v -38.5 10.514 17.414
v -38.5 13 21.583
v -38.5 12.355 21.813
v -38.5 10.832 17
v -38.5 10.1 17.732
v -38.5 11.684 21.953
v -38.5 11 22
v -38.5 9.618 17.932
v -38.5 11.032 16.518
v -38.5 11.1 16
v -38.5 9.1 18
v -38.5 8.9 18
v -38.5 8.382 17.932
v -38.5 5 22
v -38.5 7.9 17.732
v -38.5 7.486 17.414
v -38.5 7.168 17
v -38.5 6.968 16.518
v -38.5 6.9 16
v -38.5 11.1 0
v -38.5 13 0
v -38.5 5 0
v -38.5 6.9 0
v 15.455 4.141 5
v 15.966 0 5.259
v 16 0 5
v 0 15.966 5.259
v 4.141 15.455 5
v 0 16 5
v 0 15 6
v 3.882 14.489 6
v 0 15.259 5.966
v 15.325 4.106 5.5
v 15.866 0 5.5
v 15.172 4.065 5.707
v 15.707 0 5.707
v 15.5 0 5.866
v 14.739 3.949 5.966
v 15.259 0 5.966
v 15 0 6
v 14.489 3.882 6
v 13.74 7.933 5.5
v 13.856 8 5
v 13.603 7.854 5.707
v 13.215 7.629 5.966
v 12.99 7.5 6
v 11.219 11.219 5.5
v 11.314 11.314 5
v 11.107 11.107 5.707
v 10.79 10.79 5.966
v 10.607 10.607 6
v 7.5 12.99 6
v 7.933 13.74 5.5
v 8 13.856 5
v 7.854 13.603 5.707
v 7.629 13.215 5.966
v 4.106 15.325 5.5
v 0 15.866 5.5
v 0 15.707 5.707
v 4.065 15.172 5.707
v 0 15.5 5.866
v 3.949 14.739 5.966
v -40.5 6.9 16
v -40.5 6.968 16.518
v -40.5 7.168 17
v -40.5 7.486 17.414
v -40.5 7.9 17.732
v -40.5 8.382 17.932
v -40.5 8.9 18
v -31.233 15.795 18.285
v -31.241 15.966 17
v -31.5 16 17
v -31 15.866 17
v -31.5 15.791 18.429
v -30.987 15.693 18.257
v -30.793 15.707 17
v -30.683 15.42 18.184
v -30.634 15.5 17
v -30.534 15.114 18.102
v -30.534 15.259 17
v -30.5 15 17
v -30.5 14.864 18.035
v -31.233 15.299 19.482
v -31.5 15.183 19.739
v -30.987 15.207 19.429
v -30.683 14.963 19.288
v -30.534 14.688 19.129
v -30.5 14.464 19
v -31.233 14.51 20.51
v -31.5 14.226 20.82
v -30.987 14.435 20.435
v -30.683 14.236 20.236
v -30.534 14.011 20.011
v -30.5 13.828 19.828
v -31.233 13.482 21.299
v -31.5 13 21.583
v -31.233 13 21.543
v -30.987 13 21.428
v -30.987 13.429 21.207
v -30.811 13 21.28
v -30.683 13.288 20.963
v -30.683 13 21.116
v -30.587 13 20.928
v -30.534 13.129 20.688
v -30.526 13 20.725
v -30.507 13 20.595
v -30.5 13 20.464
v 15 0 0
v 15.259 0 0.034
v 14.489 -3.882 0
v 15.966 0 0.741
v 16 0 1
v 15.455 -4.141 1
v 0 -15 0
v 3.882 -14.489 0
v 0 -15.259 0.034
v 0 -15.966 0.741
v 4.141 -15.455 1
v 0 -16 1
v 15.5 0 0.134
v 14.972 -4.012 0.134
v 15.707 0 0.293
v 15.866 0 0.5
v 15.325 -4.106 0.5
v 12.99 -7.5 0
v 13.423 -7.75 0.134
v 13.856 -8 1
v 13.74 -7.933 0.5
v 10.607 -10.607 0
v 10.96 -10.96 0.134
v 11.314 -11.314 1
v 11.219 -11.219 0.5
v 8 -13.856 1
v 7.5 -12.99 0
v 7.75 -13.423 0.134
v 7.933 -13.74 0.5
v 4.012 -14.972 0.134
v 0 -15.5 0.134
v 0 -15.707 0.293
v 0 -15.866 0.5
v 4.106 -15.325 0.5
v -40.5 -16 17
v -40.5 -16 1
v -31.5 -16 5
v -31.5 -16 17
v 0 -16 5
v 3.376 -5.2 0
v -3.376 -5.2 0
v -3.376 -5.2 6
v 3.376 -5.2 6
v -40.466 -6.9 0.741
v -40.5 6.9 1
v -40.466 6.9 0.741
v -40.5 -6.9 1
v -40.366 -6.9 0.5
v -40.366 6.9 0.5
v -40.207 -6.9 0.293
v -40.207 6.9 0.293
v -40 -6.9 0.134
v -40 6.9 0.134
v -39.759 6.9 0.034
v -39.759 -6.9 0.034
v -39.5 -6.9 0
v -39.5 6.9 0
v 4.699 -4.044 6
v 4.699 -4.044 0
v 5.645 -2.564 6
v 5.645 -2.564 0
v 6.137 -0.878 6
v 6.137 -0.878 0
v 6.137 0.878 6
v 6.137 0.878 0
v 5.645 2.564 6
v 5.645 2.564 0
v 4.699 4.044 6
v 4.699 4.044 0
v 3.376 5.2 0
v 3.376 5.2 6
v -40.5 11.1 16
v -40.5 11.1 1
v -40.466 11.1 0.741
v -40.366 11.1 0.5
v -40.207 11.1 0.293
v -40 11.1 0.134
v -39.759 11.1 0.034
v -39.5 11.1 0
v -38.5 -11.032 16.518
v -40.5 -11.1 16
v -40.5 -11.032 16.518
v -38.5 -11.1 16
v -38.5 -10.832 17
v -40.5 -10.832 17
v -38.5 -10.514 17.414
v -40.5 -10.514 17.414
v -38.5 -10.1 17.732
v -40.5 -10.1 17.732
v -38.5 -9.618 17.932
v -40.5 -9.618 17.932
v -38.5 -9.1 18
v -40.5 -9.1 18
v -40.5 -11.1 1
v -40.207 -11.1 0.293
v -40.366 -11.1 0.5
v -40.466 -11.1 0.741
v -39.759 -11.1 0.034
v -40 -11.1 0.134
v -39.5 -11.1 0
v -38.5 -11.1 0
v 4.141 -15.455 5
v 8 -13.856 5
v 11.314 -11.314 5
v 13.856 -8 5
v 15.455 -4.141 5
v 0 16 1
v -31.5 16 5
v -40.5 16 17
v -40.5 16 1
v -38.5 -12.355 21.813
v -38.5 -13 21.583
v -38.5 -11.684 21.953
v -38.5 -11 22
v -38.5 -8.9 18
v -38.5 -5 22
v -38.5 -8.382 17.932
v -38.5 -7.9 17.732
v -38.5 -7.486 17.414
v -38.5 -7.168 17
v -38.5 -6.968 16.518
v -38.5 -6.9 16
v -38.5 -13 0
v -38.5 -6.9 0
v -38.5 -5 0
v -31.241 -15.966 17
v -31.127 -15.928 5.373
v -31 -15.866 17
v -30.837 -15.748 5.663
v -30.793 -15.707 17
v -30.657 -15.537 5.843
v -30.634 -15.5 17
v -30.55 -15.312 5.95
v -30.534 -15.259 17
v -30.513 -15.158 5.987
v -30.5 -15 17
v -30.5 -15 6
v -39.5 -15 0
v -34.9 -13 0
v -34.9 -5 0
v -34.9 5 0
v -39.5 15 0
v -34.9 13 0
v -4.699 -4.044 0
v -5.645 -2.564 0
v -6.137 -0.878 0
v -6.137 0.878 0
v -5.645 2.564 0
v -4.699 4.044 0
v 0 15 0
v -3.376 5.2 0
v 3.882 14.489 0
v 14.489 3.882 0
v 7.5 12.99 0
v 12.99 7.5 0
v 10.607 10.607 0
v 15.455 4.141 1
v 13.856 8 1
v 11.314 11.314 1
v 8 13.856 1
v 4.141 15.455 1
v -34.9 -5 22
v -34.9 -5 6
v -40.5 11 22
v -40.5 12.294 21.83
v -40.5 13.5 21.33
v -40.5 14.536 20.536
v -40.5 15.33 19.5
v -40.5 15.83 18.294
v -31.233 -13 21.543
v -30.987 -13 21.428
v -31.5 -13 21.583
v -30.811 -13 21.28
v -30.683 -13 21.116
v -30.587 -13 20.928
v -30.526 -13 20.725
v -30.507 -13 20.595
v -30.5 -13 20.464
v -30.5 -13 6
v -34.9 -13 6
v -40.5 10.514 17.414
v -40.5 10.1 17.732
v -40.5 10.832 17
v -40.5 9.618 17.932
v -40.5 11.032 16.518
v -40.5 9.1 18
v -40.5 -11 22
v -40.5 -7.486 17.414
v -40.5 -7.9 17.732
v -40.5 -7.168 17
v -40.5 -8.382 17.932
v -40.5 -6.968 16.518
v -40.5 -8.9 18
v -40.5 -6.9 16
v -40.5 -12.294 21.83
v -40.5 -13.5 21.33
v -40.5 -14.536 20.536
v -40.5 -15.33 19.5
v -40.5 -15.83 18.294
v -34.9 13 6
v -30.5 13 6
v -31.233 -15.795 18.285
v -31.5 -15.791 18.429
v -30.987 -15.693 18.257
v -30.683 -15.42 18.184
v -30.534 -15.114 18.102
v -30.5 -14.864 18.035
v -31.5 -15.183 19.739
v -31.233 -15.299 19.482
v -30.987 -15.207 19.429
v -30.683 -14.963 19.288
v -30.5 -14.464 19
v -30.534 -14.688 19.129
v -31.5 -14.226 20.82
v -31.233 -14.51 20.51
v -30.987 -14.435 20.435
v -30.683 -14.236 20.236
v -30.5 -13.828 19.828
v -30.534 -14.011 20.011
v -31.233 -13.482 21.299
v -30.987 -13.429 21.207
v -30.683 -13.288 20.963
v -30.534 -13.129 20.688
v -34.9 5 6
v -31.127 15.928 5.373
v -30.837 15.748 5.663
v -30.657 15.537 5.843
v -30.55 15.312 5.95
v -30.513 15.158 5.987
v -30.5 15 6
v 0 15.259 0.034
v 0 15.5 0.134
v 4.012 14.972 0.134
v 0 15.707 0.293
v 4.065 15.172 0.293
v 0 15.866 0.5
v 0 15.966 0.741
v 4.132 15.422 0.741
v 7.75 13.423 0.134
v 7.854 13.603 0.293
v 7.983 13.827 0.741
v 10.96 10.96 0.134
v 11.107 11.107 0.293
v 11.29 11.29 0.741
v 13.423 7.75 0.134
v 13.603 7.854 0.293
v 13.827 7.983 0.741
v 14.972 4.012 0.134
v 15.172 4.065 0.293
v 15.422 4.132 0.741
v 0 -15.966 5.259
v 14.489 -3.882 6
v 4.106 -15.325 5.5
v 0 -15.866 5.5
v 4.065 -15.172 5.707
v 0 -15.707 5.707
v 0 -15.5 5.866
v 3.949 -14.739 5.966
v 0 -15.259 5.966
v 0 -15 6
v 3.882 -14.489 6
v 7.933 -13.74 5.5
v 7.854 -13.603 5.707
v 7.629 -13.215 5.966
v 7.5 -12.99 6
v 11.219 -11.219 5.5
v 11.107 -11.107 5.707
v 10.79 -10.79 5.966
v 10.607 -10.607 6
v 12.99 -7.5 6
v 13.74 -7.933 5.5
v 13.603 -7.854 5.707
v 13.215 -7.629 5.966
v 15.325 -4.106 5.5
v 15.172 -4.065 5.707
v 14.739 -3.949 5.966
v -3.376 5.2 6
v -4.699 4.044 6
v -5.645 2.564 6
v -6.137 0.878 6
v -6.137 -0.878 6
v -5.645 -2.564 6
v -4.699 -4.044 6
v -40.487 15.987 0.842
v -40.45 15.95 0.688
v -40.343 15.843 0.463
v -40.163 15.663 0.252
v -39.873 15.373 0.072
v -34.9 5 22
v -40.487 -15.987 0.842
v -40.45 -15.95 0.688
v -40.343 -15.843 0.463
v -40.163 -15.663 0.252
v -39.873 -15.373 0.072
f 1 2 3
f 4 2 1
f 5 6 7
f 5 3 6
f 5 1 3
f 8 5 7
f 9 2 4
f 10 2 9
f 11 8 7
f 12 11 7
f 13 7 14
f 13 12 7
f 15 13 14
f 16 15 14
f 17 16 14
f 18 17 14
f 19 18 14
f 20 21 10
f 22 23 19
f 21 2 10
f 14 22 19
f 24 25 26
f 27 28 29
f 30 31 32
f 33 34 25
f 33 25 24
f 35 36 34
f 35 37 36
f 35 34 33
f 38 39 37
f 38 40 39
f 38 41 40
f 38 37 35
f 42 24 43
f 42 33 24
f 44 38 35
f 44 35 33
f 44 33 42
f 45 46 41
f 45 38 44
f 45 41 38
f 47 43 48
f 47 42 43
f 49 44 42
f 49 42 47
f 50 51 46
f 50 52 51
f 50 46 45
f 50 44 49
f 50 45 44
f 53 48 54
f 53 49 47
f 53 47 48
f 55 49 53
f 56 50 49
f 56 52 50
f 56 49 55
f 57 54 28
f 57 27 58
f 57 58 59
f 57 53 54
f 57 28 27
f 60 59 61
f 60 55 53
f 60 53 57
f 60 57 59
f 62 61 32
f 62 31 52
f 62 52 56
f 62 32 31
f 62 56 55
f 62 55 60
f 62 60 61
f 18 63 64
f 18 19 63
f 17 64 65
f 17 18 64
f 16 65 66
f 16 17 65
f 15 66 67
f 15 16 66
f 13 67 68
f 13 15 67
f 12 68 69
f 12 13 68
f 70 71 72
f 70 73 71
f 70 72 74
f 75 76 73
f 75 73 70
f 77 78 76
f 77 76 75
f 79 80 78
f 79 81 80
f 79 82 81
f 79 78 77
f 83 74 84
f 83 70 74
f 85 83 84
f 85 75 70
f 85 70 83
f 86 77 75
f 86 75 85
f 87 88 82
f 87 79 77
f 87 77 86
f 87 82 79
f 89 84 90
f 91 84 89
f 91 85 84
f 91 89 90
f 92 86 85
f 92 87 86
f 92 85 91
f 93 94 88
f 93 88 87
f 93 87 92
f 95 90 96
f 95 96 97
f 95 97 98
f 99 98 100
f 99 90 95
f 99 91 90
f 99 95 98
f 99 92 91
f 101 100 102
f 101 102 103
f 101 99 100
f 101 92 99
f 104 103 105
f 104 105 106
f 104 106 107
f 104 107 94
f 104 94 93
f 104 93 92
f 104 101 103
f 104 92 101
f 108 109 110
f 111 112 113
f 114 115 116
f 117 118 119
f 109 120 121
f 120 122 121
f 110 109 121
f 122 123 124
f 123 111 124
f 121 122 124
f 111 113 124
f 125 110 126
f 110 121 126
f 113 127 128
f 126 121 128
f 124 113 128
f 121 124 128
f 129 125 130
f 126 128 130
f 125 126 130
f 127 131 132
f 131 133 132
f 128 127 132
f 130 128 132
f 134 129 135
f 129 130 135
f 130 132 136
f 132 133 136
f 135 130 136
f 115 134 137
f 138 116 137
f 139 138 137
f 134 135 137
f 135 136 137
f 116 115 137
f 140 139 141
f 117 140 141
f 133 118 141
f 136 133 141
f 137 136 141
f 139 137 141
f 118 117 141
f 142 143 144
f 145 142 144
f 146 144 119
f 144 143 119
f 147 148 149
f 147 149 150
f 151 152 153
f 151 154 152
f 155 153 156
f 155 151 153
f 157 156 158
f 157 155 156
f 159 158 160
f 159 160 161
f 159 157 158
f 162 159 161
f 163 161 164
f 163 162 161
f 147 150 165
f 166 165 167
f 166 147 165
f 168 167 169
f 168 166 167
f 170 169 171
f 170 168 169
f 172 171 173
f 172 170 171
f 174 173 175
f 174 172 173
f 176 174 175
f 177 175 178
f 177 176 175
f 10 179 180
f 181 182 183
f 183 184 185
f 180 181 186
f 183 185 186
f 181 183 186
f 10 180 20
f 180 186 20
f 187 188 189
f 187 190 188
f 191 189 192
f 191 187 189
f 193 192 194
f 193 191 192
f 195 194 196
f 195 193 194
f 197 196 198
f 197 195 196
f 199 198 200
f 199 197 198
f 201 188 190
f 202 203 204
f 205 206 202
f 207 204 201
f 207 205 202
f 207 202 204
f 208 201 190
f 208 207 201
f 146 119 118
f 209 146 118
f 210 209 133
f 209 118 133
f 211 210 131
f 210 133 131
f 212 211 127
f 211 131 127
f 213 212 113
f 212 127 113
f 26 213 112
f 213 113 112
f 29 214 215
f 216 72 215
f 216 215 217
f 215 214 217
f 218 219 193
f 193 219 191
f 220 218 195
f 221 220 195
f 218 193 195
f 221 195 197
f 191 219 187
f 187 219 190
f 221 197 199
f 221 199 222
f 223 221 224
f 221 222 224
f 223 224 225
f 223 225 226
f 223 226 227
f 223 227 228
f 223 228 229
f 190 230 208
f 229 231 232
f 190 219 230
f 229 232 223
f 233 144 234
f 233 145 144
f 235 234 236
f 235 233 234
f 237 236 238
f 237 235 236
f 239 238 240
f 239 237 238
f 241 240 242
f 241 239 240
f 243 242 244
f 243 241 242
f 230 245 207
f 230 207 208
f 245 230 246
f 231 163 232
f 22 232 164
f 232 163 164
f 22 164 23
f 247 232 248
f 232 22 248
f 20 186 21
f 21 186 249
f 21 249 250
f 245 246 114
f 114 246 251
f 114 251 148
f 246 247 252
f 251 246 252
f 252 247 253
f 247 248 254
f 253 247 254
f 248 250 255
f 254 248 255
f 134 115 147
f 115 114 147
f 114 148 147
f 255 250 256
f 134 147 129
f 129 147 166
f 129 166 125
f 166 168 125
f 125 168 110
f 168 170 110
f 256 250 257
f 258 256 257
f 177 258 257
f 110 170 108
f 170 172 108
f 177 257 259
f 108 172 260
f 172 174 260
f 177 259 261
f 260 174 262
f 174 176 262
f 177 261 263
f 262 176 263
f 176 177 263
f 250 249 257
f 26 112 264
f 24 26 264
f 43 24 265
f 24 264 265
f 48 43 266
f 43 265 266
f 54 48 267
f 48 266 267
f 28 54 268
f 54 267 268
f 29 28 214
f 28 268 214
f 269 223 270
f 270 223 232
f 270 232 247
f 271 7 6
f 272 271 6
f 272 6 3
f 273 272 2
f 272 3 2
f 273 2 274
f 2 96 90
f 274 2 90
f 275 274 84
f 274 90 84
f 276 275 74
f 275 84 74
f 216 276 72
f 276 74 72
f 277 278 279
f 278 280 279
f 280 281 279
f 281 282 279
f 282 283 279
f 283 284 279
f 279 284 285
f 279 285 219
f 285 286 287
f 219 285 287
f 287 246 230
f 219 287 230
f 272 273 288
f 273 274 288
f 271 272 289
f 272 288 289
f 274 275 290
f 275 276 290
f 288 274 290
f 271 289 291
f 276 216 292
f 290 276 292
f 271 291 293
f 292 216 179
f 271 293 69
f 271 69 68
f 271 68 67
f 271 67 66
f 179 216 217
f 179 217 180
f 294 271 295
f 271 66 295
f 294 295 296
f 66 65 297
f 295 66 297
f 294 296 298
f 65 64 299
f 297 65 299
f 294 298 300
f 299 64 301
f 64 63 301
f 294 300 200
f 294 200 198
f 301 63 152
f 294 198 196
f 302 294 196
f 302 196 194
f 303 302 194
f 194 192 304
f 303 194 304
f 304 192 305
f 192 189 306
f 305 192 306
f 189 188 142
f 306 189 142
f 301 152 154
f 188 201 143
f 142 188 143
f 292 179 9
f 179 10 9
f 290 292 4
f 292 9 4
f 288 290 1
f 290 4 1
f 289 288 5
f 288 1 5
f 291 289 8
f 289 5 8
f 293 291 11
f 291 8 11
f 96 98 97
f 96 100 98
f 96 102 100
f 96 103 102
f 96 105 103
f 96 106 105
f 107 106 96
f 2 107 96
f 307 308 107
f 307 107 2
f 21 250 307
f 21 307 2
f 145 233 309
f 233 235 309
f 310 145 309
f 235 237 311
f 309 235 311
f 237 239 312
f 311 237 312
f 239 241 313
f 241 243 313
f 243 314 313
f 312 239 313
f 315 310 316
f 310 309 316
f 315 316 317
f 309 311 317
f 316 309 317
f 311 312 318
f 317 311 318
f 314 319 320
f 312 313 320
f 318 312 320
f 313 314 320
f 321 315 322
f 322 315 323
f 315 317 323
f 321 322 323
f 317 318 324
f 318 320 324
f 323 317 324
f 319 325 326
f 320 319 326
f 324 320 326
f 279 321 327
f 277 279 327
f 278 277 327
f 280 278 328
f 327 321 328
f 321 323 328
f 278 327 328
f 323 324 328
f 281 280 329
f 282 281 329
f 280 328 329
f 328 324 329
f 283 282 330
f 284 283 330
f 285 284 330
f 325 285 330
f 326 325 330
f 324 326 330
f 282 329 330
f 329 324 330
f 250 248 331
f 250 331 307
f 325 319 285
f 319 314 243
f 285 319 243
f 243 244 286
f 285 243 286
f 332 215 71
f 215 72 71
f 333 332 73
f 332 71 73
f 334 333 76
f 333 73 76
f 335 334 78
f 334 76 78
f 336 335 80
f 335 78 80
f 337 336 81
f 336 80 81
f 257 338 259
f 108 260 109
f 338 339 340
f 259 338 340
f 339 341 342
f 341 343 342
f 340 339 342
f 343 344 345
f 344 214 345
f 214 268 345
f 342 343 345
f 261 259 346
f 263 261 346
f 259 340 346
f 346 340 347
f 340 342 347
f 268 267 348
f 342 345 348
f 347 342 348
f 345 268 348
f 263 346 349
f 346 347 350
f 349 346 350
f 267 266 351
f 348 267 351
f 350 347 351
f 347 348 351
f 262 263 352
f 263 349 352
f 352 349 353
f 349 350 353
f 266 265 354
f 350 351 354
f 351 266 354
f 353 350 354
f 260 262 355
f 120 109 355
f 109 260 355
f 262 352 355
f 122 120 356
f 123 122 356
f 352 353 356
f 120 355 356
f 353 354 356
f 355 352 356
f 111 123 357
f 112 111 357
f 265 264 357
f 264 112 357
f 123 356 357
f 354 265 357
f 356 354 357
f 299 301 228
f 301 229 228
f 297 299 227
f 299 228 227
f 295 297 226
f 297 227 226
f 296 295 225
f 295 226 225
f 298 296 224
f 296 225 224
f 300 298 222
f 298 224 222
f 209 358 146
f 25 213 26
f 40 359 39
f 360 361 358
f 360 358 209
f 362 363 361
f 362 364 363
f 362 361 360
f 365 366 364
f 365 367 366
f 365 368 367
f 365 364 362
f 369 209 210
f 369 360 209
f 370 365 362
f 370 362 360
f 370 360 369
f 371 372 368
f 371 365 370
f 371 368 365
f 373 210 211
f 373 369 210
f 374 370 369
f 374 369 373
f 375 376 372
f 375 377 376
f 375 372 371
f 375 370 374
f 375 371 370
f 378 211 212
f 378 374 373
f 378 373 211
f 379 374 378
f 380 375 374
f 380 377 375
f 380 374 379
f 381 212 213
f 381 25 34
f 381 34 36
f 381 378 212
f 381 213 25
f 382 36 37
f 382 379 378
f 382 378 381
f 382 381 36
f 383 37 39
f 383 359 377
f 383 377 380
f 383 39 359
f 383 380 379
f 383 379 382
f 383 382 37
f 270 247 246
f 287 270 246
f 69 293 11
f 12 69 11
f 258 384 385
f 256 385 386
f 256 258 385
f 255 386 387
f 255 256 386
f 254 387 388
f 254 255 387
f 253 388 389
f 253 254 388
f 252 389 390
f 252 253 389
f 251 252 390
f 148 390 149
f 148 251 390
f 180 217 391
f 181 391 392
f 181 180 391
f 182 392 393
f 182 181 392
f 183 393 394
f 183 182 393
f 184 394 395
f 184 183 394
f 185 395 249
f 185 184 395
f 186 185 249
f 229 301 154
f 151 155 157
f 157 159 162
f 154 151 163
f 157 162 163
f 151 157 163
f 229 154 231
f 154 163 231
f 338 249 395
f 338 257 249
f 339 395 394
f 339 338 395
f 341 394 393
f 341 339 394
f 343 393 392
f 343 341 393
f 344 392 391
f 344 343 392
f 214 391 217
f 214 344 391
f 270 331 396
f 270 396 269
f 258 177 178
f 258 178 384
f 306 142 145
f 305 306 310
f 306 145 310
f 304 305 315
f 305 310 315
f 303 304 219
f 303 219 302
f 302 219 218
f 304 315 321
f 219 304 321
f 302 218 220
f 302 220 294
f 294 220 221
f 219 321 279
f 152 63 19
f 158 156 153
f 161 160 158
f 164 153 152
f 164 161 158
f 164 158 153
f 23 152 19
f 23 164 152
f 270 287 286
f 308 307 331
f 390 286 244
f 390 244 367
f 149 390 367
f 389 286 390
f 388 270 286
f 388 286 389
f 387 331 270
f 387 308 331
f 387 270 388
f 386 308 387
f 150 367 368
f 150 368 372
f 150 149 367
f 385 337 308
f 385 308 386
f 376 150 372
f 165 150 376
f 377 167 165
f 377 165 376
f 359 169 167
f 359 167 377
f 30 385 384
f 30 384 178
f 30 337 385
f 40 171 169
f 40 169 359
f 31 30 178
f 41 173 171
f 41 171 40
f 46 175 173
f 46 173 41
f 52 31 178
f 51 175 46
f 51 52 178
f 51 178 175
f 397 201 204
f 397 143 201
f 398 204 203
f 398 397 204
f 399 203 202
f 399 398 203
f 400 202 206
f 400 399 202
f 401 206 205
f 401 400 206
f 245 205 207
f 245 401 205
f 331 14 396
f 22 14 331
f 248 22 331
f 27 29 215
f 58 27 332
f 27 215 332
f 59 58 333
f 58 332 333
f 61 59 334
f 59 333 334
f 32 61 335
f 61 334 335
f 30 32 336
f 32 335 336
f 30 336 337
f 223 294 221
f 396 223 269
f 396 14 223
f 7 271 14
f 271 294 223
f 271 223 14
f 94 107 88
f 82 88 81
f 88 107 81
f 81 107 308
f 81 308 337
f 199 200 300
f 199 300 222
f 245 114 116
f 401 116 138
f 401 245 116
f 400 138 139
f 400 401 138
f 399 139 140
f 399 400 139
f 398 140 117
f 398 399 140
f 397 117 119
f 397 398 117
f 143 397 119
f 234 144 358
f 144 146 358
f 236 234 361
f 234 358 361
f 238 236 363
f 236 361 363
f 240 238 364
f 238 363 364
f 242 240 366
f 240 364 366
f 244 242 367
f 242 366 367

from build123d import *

# Parameters (mm, degrees)
F1_DEPTH  = 6
F2_W      = 10
F2_H      = 32
F3_DEPTH  = 22
F4_W      = 2
F4_H      = 4.2
F5_DEPTH  = 18
F6_R      = 2
F10_DEPTH = 25
F13_DEPTH = 25
F14_R     = 5
F15_R     = 1
F16_R     = 1


with BuildPart() as f1:
    # F0 (on Top) → F1 (new body)
    with BuildSketch(Plane.XY):
        with BuildLine():
            ThreePointArc((0, -16), (11.313708499, -11.313708499), (16, 0))
            ThreePointArc((16, 0), (11.313708499, 11.313708499), (0, 16))
            Line((0, 16), (0, -16))
        make_face()
        with BuildLine():
            Line((0, -16), (0, 16))
            ThreePointArc((0, 16), (-16, 0), (0, -16))
        make_face()
        with BuildLine():
            ThreePointArc((0, -16), (-16, 0), (0, 16))
            Line((0, 16), (-40.5, 16))
            Line((-40.5, 16), (-40.5, -16))
            Line((-40.5, -16), (0, -16))
        make_face()
    extrude(amount=F1_DEPTH)

    # F2 (on Top) → F3 (join)
    with BuildSketch(Plane.XY):
        with Locations((-35.5, 0)):
            Rectangle(F2_W, F2_H)
    extrude(amount=F3_DEPTH)

    # F4 (on Top) → F5 (cut)
    with BuildSketch(Plane.XY):
        Polygon((-34.9, 13), (-38.5, 13), (-38.5, 11.1), (-38.5, 6.9), (-38.5, 5), (-34.9, 5), align=None)
        with Locations((-39.5, 9)):
            Rectangle(F4_W, F4_H)
    extrude(amount=F5_DEPTH, mode=Mode.SUBTRACT)

    # F6
    f6_edges = [f1.edges().sort_by_distance(p)[0] for p in [
        (-39.5, 6.9, 18),
        (-39.5, 11.1, 18),
    ]]
    fillet(f6_edges, radius=F6_R)

    # F7: F1 across plane


with BuildPart() as f1_1:
    add(f1.part)
    add(f1.part.mirror(Plane.XZ), mode=Mode.INTERSECT)

    # F9 (on offset) → F10 (cut)
    with BuildSketch(Plane.XY.offset(6)):
        Polygon((-30.5, 13), (-38.5, 13), (-38.5, 5), (-34.9, 5), (-34.9, -5), (-38.5, -5), (-38.5, -13), (-30.5, -13), align=None)
    extrude(amount=F10_DEPTH, mode=Mode.SUBTRACT)

    # F12 (on face) → F13 (cut)
    with BuildSketch(Plane.XY):
        with BuildLine():
            Line((-3.3763886032, -5.2), (3.3763886032, -5.2))
            ThreePointArc((3.3763886032, -5.2), (6.2, 0), (3.3763886032, 5.2))
            Line((3.3763886032, 5.2), (-3.3763886032, 5.2))
            ThreePointArc((-3.3763886032, 5.2), (-6.2, 0), (-3.3763886032, -5.2))
        make_face()
    extrude(amount=F13_DEPTH, mode=Mode.SUBTRACT)

    # F14
    f14_edges = [f1_1.edges().sort_by_distance(p)[0] for p in [
        (-35.5, 16, 22),
        (-35.5, -16, 22),
    ]]
    fillet(f14_edges, radius=F14_R)

    # F15
    f15_edges = [f1_1.edges().sort_by_distance(p)[0] for p in [
        (-15.25, 16, 6),
        (16, 0, 6),
        (-15.25, -16, 6),
        (-30.5, -16, 11.5),
        (-30.5, 16, 11.5),
    ]]
    fillet(f15_edges, radius=F15_R)

    # F16
    f16_edges = [f1_1.edges().sort_by_distance(p)[0] for p in [
        (-20.25, 16, 0),
        (-40.5, 0, 0),
        (-40.5, 13.55, 0),
        (-40.5, -13.55, 0),
    ]]
    fillet(f16_edges, radius=F16_R)


solid = f1_1.part
